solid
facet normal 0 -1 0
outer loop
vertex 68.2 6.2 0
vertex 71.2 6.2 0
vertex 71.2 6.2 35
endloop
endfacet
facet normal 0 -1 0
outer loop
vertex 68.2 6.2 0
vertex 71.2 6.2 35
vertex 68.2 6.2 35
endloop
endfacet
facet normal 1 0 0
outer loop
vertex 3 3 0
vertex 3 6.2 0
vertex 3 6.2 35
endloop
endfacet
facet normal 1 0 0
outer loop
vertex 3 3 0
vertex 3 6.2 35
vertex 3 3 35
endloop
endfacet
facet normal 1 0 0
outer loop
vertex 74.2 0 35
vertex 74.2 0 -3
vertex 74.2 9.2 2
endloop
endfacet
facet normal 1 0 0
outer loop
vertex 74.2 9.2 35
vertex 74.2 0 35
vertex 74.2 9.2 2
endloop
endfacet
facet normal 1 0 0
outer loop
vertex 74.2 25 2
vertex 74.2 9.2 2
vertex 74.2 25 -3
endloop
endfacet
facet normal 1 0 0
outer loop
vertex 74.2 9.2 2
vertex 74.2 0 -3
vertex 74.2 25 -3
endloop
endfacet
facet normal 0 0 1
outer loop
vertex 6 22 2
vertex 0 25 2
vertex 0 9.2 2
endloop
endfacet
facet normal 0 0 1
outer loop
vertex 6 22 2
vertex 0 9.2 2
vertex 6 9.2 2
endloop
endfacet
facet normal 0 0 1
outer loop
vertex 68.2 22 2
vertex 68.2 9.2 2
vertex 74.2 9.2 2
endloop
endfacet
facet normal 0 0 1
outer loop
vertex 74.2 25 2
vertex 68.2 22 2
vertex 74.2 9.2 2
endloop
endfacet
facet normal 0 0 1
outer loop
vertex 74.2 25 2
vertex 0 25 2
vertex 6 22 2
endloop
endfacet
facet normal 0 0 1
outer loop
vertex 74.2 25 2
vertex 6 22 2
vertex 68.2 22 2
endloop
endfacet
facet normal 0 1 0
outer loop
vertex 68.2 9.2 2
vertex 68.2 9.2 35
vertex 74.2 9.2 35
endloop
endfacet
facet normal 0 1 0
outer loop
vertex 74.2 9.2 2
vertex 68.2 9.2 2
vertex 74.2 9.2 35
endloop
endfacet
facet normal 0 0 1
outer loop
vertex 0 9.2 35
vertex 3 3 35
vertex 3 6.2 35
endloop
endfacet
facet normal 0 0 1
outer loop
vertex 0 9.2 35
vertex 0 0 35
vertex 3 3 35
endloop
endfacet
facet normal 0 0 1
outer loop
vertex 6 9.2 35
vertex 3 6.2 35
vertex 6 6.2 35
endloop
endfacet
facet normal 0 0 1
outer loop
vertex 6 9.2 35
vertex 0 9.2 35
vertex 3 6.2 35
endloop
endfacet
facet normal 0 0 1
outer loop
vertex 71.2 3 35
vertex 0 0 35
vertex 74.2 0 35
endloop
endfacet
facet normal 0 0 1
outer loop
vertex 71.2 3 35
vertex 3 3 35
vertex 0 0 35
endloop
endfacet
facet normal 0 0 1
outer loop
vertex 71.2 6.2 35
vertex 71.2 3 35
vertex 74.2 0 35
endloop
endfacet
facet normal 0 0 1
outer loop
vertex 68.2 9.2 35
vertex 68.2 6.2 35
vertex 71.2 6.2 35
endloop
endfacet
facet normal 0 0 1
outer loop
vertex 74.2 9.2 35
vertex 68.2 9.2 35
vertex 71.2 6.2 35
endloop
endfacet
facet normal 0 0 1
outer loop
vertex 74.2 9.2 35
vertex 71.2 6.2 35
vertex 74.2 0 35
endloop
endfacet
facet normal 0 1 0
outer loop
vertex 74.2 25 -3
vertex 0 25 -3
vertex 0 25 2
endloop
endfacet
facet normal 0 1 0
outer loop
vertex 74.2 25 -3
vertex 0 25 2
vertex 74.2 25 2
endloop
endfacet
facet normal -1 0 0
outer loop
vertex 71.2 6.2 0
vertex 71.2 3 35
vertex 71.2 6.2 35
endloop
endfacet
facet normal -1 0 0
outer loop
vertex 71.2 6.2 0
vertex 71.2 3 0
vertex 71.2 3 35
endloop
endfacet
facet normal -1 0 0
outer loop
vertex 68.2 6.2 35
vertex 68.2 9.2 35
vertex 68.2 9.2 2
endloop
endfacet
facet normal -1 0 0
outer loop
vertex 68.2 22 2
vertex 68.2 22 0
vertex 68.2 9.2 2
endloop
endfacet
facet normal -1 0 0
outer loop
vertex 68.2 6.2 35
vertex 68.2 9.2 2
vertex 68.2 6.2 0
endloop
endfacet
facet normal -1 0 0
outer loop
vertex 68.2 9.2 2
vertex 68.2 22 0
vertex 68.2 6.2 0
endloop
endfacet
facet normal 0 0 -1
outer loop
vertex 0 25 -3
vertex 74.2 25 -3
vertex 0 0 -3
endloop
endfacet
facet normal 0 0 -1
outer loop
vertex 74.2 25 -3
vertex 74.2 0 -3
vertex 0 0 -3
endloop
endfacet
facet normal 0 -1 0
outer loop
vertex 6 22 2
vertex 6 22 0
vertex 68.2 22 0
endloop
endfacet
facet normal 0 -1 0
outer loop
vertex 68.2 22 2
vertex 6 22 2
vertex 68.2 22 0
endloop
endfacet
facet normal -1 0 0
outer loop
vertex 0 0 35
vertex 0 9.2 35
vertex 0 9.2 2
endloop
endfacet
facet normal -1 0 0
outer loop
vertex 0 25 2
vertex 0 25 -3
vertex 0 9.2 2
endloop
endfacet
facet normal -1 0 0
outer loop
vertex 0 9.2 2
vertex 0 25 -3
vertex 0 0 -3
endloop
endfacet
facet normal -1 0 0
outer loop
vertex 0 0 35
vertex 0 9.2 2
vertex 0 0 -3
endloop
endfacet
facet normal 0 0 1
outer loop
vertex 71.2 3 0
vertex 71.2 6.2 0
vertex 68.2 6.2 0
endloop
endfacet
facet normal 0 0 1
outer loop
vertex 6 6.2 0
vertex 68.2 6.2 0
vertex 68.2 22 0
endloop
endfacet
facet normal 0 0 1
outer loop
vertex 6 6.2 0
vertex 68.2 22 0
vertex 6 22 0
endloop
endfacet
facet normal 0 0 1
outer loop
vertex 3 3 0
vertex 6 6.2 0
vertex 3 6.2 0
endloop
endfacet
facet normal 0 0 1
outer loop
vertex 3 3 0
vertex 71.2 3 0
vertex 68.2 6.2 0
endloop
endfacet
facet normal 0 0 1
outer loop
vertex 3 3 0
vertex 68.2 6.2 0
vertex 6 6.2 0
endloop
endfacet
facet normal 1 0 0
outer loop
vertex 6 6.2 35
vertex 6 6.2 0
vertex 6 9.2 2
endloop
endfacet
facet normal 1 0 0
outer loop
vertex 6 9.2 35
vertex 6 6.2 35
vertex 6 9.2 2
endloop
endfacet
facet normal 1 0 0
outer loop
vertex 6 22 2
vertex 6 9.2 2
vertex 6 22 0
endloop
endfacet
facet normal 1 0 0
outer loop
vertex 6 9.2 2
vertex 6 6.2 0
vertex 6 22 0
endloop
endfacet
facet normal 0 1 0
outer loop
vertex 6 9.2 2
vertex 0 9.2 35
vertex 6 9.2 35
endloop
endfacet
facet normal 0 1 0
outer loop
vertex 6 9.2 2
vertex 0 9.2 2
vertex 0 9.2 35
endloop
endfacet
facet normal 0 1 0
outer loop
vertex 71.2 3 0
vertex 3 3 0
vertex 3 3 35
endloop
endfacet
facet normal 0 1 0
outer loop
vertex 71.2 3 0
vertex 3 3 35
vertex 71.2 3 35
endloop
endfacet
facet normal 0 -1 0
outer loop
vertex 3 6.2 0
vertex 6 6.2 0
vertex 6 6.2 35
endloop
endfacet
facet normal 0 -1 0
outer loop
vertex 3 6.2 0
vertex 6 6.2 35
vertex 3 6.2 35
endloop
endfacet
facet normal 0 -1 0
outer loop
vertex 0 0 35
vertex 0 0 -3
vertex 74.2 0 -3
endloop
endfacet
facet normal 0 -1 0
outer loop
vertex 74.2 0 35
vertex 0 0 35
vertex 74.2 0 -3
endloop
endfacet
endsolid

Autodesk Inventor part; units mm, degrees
ref_plane "YZ Plane" through (0, 0, 0) normal (1, 0, 0) x (0, 1, 0)
ref_plane "XZ Plane" through (0, 0, 0) normal (0, 1, 0) x (-1, 0, 0)
ref_plane "XY Plane" through (0, 0, 0) normal (0, 0, 1) x (1, 0, 0)
sketch "Эскиз1" plane through (0, 0, 0) normal (0, 0, 1) x (1, 0, 0)
  line L0 (0, 0) -> (74.2, 0)
  line L1 (0, 0) -> (0, 9.2)
  line L2 (0, 9.2) -> (6, 9.2)
  line L3 (6, 9.2) -> (6, 6.2)
  line L4 (6, 6.2) -> (3, 6.2)
  line L5 (3, 6.2) -> (3, 3)
  line L6 (71.2, 3) -> (71.2, 6.2)
  line L7 (71.2, 6.2) -> (68.2, 6.2)
  line L8 (68.2, 6.2) -> (68.2, 9.2)
  line L9 (68.2, 9.2) -> (74.2, 9.2)
  line L10 (74.2, 9.2) -> (74.2, 0)
  line L11 (3, 3) -> (71.2, 3)
  dimension "d2" = 68.2
  dimension "d3" = 3
  dimension "d4" = 3
  dimension "d5" = 3
  dimension "d6" = 3
  dimension "d7" = 3
  dimension "d8" = 3
  dimension "d9" = 3
  dimension "d10" = 3.2
extrude "Выдавливание1" add sketch "Эскиз1" along normal blind 35
sketch "Эскиз2" plane through (0, 0, 0) normal (0, -1, 0) x (1, 0, 0)
  line L0 (6, 0) -> (0, 0) projected
  line L1 (0, 0) -> (74.2, 0)
  line L2 (74.2, 0) -> (74.2, -3)
  line L3 (74.2, -3) -> (0, -3)
  line L4 (0, -3) -> (0, 0)
  point P0 (74.2, -1.5)
  dimension "d13" = 3
extrude "Выдавливание2" add sketch "Эскиз2" against normal blind 25
sketch "Эскиз3" plane through (0, 25, 0) normal (0, 0, 1) x (1, 0, 0)
  line L0 (74.2, -15.8) -> (74.2, 0) projected
  line L1 (74.2, -15.8) -> (74.2, 0)
  line L2 (0, 0) -> (74.2, 0) projected
  line L3 (74.2, 0) -> (0, 0)
  line L4 (6, -15.8) -> (0, -15.8) projected
  line L5 (0, 0) -> (0, -15.8)
  line L6 (0, -15.8) -> (6, -15.8)
  line L7 (6, -15.8) -> (6, -3)
  line L8 (6, -3) -> (68.2, -3)
  line L9 (68.2, -3) -> (68.2, -15.8)
  line L10 (74.2, -15.8) -> (68.2, -15.8) projected
  line L11 (74.2, -15.8) -> (68.2, -15.8)
  point P0 (0, -25)
  dimension "d16" = 3
extrude "Выдавливание3" add sketch "Эскиз3" along normal blind 2
properties part number "креплениедлякамерыверх"
